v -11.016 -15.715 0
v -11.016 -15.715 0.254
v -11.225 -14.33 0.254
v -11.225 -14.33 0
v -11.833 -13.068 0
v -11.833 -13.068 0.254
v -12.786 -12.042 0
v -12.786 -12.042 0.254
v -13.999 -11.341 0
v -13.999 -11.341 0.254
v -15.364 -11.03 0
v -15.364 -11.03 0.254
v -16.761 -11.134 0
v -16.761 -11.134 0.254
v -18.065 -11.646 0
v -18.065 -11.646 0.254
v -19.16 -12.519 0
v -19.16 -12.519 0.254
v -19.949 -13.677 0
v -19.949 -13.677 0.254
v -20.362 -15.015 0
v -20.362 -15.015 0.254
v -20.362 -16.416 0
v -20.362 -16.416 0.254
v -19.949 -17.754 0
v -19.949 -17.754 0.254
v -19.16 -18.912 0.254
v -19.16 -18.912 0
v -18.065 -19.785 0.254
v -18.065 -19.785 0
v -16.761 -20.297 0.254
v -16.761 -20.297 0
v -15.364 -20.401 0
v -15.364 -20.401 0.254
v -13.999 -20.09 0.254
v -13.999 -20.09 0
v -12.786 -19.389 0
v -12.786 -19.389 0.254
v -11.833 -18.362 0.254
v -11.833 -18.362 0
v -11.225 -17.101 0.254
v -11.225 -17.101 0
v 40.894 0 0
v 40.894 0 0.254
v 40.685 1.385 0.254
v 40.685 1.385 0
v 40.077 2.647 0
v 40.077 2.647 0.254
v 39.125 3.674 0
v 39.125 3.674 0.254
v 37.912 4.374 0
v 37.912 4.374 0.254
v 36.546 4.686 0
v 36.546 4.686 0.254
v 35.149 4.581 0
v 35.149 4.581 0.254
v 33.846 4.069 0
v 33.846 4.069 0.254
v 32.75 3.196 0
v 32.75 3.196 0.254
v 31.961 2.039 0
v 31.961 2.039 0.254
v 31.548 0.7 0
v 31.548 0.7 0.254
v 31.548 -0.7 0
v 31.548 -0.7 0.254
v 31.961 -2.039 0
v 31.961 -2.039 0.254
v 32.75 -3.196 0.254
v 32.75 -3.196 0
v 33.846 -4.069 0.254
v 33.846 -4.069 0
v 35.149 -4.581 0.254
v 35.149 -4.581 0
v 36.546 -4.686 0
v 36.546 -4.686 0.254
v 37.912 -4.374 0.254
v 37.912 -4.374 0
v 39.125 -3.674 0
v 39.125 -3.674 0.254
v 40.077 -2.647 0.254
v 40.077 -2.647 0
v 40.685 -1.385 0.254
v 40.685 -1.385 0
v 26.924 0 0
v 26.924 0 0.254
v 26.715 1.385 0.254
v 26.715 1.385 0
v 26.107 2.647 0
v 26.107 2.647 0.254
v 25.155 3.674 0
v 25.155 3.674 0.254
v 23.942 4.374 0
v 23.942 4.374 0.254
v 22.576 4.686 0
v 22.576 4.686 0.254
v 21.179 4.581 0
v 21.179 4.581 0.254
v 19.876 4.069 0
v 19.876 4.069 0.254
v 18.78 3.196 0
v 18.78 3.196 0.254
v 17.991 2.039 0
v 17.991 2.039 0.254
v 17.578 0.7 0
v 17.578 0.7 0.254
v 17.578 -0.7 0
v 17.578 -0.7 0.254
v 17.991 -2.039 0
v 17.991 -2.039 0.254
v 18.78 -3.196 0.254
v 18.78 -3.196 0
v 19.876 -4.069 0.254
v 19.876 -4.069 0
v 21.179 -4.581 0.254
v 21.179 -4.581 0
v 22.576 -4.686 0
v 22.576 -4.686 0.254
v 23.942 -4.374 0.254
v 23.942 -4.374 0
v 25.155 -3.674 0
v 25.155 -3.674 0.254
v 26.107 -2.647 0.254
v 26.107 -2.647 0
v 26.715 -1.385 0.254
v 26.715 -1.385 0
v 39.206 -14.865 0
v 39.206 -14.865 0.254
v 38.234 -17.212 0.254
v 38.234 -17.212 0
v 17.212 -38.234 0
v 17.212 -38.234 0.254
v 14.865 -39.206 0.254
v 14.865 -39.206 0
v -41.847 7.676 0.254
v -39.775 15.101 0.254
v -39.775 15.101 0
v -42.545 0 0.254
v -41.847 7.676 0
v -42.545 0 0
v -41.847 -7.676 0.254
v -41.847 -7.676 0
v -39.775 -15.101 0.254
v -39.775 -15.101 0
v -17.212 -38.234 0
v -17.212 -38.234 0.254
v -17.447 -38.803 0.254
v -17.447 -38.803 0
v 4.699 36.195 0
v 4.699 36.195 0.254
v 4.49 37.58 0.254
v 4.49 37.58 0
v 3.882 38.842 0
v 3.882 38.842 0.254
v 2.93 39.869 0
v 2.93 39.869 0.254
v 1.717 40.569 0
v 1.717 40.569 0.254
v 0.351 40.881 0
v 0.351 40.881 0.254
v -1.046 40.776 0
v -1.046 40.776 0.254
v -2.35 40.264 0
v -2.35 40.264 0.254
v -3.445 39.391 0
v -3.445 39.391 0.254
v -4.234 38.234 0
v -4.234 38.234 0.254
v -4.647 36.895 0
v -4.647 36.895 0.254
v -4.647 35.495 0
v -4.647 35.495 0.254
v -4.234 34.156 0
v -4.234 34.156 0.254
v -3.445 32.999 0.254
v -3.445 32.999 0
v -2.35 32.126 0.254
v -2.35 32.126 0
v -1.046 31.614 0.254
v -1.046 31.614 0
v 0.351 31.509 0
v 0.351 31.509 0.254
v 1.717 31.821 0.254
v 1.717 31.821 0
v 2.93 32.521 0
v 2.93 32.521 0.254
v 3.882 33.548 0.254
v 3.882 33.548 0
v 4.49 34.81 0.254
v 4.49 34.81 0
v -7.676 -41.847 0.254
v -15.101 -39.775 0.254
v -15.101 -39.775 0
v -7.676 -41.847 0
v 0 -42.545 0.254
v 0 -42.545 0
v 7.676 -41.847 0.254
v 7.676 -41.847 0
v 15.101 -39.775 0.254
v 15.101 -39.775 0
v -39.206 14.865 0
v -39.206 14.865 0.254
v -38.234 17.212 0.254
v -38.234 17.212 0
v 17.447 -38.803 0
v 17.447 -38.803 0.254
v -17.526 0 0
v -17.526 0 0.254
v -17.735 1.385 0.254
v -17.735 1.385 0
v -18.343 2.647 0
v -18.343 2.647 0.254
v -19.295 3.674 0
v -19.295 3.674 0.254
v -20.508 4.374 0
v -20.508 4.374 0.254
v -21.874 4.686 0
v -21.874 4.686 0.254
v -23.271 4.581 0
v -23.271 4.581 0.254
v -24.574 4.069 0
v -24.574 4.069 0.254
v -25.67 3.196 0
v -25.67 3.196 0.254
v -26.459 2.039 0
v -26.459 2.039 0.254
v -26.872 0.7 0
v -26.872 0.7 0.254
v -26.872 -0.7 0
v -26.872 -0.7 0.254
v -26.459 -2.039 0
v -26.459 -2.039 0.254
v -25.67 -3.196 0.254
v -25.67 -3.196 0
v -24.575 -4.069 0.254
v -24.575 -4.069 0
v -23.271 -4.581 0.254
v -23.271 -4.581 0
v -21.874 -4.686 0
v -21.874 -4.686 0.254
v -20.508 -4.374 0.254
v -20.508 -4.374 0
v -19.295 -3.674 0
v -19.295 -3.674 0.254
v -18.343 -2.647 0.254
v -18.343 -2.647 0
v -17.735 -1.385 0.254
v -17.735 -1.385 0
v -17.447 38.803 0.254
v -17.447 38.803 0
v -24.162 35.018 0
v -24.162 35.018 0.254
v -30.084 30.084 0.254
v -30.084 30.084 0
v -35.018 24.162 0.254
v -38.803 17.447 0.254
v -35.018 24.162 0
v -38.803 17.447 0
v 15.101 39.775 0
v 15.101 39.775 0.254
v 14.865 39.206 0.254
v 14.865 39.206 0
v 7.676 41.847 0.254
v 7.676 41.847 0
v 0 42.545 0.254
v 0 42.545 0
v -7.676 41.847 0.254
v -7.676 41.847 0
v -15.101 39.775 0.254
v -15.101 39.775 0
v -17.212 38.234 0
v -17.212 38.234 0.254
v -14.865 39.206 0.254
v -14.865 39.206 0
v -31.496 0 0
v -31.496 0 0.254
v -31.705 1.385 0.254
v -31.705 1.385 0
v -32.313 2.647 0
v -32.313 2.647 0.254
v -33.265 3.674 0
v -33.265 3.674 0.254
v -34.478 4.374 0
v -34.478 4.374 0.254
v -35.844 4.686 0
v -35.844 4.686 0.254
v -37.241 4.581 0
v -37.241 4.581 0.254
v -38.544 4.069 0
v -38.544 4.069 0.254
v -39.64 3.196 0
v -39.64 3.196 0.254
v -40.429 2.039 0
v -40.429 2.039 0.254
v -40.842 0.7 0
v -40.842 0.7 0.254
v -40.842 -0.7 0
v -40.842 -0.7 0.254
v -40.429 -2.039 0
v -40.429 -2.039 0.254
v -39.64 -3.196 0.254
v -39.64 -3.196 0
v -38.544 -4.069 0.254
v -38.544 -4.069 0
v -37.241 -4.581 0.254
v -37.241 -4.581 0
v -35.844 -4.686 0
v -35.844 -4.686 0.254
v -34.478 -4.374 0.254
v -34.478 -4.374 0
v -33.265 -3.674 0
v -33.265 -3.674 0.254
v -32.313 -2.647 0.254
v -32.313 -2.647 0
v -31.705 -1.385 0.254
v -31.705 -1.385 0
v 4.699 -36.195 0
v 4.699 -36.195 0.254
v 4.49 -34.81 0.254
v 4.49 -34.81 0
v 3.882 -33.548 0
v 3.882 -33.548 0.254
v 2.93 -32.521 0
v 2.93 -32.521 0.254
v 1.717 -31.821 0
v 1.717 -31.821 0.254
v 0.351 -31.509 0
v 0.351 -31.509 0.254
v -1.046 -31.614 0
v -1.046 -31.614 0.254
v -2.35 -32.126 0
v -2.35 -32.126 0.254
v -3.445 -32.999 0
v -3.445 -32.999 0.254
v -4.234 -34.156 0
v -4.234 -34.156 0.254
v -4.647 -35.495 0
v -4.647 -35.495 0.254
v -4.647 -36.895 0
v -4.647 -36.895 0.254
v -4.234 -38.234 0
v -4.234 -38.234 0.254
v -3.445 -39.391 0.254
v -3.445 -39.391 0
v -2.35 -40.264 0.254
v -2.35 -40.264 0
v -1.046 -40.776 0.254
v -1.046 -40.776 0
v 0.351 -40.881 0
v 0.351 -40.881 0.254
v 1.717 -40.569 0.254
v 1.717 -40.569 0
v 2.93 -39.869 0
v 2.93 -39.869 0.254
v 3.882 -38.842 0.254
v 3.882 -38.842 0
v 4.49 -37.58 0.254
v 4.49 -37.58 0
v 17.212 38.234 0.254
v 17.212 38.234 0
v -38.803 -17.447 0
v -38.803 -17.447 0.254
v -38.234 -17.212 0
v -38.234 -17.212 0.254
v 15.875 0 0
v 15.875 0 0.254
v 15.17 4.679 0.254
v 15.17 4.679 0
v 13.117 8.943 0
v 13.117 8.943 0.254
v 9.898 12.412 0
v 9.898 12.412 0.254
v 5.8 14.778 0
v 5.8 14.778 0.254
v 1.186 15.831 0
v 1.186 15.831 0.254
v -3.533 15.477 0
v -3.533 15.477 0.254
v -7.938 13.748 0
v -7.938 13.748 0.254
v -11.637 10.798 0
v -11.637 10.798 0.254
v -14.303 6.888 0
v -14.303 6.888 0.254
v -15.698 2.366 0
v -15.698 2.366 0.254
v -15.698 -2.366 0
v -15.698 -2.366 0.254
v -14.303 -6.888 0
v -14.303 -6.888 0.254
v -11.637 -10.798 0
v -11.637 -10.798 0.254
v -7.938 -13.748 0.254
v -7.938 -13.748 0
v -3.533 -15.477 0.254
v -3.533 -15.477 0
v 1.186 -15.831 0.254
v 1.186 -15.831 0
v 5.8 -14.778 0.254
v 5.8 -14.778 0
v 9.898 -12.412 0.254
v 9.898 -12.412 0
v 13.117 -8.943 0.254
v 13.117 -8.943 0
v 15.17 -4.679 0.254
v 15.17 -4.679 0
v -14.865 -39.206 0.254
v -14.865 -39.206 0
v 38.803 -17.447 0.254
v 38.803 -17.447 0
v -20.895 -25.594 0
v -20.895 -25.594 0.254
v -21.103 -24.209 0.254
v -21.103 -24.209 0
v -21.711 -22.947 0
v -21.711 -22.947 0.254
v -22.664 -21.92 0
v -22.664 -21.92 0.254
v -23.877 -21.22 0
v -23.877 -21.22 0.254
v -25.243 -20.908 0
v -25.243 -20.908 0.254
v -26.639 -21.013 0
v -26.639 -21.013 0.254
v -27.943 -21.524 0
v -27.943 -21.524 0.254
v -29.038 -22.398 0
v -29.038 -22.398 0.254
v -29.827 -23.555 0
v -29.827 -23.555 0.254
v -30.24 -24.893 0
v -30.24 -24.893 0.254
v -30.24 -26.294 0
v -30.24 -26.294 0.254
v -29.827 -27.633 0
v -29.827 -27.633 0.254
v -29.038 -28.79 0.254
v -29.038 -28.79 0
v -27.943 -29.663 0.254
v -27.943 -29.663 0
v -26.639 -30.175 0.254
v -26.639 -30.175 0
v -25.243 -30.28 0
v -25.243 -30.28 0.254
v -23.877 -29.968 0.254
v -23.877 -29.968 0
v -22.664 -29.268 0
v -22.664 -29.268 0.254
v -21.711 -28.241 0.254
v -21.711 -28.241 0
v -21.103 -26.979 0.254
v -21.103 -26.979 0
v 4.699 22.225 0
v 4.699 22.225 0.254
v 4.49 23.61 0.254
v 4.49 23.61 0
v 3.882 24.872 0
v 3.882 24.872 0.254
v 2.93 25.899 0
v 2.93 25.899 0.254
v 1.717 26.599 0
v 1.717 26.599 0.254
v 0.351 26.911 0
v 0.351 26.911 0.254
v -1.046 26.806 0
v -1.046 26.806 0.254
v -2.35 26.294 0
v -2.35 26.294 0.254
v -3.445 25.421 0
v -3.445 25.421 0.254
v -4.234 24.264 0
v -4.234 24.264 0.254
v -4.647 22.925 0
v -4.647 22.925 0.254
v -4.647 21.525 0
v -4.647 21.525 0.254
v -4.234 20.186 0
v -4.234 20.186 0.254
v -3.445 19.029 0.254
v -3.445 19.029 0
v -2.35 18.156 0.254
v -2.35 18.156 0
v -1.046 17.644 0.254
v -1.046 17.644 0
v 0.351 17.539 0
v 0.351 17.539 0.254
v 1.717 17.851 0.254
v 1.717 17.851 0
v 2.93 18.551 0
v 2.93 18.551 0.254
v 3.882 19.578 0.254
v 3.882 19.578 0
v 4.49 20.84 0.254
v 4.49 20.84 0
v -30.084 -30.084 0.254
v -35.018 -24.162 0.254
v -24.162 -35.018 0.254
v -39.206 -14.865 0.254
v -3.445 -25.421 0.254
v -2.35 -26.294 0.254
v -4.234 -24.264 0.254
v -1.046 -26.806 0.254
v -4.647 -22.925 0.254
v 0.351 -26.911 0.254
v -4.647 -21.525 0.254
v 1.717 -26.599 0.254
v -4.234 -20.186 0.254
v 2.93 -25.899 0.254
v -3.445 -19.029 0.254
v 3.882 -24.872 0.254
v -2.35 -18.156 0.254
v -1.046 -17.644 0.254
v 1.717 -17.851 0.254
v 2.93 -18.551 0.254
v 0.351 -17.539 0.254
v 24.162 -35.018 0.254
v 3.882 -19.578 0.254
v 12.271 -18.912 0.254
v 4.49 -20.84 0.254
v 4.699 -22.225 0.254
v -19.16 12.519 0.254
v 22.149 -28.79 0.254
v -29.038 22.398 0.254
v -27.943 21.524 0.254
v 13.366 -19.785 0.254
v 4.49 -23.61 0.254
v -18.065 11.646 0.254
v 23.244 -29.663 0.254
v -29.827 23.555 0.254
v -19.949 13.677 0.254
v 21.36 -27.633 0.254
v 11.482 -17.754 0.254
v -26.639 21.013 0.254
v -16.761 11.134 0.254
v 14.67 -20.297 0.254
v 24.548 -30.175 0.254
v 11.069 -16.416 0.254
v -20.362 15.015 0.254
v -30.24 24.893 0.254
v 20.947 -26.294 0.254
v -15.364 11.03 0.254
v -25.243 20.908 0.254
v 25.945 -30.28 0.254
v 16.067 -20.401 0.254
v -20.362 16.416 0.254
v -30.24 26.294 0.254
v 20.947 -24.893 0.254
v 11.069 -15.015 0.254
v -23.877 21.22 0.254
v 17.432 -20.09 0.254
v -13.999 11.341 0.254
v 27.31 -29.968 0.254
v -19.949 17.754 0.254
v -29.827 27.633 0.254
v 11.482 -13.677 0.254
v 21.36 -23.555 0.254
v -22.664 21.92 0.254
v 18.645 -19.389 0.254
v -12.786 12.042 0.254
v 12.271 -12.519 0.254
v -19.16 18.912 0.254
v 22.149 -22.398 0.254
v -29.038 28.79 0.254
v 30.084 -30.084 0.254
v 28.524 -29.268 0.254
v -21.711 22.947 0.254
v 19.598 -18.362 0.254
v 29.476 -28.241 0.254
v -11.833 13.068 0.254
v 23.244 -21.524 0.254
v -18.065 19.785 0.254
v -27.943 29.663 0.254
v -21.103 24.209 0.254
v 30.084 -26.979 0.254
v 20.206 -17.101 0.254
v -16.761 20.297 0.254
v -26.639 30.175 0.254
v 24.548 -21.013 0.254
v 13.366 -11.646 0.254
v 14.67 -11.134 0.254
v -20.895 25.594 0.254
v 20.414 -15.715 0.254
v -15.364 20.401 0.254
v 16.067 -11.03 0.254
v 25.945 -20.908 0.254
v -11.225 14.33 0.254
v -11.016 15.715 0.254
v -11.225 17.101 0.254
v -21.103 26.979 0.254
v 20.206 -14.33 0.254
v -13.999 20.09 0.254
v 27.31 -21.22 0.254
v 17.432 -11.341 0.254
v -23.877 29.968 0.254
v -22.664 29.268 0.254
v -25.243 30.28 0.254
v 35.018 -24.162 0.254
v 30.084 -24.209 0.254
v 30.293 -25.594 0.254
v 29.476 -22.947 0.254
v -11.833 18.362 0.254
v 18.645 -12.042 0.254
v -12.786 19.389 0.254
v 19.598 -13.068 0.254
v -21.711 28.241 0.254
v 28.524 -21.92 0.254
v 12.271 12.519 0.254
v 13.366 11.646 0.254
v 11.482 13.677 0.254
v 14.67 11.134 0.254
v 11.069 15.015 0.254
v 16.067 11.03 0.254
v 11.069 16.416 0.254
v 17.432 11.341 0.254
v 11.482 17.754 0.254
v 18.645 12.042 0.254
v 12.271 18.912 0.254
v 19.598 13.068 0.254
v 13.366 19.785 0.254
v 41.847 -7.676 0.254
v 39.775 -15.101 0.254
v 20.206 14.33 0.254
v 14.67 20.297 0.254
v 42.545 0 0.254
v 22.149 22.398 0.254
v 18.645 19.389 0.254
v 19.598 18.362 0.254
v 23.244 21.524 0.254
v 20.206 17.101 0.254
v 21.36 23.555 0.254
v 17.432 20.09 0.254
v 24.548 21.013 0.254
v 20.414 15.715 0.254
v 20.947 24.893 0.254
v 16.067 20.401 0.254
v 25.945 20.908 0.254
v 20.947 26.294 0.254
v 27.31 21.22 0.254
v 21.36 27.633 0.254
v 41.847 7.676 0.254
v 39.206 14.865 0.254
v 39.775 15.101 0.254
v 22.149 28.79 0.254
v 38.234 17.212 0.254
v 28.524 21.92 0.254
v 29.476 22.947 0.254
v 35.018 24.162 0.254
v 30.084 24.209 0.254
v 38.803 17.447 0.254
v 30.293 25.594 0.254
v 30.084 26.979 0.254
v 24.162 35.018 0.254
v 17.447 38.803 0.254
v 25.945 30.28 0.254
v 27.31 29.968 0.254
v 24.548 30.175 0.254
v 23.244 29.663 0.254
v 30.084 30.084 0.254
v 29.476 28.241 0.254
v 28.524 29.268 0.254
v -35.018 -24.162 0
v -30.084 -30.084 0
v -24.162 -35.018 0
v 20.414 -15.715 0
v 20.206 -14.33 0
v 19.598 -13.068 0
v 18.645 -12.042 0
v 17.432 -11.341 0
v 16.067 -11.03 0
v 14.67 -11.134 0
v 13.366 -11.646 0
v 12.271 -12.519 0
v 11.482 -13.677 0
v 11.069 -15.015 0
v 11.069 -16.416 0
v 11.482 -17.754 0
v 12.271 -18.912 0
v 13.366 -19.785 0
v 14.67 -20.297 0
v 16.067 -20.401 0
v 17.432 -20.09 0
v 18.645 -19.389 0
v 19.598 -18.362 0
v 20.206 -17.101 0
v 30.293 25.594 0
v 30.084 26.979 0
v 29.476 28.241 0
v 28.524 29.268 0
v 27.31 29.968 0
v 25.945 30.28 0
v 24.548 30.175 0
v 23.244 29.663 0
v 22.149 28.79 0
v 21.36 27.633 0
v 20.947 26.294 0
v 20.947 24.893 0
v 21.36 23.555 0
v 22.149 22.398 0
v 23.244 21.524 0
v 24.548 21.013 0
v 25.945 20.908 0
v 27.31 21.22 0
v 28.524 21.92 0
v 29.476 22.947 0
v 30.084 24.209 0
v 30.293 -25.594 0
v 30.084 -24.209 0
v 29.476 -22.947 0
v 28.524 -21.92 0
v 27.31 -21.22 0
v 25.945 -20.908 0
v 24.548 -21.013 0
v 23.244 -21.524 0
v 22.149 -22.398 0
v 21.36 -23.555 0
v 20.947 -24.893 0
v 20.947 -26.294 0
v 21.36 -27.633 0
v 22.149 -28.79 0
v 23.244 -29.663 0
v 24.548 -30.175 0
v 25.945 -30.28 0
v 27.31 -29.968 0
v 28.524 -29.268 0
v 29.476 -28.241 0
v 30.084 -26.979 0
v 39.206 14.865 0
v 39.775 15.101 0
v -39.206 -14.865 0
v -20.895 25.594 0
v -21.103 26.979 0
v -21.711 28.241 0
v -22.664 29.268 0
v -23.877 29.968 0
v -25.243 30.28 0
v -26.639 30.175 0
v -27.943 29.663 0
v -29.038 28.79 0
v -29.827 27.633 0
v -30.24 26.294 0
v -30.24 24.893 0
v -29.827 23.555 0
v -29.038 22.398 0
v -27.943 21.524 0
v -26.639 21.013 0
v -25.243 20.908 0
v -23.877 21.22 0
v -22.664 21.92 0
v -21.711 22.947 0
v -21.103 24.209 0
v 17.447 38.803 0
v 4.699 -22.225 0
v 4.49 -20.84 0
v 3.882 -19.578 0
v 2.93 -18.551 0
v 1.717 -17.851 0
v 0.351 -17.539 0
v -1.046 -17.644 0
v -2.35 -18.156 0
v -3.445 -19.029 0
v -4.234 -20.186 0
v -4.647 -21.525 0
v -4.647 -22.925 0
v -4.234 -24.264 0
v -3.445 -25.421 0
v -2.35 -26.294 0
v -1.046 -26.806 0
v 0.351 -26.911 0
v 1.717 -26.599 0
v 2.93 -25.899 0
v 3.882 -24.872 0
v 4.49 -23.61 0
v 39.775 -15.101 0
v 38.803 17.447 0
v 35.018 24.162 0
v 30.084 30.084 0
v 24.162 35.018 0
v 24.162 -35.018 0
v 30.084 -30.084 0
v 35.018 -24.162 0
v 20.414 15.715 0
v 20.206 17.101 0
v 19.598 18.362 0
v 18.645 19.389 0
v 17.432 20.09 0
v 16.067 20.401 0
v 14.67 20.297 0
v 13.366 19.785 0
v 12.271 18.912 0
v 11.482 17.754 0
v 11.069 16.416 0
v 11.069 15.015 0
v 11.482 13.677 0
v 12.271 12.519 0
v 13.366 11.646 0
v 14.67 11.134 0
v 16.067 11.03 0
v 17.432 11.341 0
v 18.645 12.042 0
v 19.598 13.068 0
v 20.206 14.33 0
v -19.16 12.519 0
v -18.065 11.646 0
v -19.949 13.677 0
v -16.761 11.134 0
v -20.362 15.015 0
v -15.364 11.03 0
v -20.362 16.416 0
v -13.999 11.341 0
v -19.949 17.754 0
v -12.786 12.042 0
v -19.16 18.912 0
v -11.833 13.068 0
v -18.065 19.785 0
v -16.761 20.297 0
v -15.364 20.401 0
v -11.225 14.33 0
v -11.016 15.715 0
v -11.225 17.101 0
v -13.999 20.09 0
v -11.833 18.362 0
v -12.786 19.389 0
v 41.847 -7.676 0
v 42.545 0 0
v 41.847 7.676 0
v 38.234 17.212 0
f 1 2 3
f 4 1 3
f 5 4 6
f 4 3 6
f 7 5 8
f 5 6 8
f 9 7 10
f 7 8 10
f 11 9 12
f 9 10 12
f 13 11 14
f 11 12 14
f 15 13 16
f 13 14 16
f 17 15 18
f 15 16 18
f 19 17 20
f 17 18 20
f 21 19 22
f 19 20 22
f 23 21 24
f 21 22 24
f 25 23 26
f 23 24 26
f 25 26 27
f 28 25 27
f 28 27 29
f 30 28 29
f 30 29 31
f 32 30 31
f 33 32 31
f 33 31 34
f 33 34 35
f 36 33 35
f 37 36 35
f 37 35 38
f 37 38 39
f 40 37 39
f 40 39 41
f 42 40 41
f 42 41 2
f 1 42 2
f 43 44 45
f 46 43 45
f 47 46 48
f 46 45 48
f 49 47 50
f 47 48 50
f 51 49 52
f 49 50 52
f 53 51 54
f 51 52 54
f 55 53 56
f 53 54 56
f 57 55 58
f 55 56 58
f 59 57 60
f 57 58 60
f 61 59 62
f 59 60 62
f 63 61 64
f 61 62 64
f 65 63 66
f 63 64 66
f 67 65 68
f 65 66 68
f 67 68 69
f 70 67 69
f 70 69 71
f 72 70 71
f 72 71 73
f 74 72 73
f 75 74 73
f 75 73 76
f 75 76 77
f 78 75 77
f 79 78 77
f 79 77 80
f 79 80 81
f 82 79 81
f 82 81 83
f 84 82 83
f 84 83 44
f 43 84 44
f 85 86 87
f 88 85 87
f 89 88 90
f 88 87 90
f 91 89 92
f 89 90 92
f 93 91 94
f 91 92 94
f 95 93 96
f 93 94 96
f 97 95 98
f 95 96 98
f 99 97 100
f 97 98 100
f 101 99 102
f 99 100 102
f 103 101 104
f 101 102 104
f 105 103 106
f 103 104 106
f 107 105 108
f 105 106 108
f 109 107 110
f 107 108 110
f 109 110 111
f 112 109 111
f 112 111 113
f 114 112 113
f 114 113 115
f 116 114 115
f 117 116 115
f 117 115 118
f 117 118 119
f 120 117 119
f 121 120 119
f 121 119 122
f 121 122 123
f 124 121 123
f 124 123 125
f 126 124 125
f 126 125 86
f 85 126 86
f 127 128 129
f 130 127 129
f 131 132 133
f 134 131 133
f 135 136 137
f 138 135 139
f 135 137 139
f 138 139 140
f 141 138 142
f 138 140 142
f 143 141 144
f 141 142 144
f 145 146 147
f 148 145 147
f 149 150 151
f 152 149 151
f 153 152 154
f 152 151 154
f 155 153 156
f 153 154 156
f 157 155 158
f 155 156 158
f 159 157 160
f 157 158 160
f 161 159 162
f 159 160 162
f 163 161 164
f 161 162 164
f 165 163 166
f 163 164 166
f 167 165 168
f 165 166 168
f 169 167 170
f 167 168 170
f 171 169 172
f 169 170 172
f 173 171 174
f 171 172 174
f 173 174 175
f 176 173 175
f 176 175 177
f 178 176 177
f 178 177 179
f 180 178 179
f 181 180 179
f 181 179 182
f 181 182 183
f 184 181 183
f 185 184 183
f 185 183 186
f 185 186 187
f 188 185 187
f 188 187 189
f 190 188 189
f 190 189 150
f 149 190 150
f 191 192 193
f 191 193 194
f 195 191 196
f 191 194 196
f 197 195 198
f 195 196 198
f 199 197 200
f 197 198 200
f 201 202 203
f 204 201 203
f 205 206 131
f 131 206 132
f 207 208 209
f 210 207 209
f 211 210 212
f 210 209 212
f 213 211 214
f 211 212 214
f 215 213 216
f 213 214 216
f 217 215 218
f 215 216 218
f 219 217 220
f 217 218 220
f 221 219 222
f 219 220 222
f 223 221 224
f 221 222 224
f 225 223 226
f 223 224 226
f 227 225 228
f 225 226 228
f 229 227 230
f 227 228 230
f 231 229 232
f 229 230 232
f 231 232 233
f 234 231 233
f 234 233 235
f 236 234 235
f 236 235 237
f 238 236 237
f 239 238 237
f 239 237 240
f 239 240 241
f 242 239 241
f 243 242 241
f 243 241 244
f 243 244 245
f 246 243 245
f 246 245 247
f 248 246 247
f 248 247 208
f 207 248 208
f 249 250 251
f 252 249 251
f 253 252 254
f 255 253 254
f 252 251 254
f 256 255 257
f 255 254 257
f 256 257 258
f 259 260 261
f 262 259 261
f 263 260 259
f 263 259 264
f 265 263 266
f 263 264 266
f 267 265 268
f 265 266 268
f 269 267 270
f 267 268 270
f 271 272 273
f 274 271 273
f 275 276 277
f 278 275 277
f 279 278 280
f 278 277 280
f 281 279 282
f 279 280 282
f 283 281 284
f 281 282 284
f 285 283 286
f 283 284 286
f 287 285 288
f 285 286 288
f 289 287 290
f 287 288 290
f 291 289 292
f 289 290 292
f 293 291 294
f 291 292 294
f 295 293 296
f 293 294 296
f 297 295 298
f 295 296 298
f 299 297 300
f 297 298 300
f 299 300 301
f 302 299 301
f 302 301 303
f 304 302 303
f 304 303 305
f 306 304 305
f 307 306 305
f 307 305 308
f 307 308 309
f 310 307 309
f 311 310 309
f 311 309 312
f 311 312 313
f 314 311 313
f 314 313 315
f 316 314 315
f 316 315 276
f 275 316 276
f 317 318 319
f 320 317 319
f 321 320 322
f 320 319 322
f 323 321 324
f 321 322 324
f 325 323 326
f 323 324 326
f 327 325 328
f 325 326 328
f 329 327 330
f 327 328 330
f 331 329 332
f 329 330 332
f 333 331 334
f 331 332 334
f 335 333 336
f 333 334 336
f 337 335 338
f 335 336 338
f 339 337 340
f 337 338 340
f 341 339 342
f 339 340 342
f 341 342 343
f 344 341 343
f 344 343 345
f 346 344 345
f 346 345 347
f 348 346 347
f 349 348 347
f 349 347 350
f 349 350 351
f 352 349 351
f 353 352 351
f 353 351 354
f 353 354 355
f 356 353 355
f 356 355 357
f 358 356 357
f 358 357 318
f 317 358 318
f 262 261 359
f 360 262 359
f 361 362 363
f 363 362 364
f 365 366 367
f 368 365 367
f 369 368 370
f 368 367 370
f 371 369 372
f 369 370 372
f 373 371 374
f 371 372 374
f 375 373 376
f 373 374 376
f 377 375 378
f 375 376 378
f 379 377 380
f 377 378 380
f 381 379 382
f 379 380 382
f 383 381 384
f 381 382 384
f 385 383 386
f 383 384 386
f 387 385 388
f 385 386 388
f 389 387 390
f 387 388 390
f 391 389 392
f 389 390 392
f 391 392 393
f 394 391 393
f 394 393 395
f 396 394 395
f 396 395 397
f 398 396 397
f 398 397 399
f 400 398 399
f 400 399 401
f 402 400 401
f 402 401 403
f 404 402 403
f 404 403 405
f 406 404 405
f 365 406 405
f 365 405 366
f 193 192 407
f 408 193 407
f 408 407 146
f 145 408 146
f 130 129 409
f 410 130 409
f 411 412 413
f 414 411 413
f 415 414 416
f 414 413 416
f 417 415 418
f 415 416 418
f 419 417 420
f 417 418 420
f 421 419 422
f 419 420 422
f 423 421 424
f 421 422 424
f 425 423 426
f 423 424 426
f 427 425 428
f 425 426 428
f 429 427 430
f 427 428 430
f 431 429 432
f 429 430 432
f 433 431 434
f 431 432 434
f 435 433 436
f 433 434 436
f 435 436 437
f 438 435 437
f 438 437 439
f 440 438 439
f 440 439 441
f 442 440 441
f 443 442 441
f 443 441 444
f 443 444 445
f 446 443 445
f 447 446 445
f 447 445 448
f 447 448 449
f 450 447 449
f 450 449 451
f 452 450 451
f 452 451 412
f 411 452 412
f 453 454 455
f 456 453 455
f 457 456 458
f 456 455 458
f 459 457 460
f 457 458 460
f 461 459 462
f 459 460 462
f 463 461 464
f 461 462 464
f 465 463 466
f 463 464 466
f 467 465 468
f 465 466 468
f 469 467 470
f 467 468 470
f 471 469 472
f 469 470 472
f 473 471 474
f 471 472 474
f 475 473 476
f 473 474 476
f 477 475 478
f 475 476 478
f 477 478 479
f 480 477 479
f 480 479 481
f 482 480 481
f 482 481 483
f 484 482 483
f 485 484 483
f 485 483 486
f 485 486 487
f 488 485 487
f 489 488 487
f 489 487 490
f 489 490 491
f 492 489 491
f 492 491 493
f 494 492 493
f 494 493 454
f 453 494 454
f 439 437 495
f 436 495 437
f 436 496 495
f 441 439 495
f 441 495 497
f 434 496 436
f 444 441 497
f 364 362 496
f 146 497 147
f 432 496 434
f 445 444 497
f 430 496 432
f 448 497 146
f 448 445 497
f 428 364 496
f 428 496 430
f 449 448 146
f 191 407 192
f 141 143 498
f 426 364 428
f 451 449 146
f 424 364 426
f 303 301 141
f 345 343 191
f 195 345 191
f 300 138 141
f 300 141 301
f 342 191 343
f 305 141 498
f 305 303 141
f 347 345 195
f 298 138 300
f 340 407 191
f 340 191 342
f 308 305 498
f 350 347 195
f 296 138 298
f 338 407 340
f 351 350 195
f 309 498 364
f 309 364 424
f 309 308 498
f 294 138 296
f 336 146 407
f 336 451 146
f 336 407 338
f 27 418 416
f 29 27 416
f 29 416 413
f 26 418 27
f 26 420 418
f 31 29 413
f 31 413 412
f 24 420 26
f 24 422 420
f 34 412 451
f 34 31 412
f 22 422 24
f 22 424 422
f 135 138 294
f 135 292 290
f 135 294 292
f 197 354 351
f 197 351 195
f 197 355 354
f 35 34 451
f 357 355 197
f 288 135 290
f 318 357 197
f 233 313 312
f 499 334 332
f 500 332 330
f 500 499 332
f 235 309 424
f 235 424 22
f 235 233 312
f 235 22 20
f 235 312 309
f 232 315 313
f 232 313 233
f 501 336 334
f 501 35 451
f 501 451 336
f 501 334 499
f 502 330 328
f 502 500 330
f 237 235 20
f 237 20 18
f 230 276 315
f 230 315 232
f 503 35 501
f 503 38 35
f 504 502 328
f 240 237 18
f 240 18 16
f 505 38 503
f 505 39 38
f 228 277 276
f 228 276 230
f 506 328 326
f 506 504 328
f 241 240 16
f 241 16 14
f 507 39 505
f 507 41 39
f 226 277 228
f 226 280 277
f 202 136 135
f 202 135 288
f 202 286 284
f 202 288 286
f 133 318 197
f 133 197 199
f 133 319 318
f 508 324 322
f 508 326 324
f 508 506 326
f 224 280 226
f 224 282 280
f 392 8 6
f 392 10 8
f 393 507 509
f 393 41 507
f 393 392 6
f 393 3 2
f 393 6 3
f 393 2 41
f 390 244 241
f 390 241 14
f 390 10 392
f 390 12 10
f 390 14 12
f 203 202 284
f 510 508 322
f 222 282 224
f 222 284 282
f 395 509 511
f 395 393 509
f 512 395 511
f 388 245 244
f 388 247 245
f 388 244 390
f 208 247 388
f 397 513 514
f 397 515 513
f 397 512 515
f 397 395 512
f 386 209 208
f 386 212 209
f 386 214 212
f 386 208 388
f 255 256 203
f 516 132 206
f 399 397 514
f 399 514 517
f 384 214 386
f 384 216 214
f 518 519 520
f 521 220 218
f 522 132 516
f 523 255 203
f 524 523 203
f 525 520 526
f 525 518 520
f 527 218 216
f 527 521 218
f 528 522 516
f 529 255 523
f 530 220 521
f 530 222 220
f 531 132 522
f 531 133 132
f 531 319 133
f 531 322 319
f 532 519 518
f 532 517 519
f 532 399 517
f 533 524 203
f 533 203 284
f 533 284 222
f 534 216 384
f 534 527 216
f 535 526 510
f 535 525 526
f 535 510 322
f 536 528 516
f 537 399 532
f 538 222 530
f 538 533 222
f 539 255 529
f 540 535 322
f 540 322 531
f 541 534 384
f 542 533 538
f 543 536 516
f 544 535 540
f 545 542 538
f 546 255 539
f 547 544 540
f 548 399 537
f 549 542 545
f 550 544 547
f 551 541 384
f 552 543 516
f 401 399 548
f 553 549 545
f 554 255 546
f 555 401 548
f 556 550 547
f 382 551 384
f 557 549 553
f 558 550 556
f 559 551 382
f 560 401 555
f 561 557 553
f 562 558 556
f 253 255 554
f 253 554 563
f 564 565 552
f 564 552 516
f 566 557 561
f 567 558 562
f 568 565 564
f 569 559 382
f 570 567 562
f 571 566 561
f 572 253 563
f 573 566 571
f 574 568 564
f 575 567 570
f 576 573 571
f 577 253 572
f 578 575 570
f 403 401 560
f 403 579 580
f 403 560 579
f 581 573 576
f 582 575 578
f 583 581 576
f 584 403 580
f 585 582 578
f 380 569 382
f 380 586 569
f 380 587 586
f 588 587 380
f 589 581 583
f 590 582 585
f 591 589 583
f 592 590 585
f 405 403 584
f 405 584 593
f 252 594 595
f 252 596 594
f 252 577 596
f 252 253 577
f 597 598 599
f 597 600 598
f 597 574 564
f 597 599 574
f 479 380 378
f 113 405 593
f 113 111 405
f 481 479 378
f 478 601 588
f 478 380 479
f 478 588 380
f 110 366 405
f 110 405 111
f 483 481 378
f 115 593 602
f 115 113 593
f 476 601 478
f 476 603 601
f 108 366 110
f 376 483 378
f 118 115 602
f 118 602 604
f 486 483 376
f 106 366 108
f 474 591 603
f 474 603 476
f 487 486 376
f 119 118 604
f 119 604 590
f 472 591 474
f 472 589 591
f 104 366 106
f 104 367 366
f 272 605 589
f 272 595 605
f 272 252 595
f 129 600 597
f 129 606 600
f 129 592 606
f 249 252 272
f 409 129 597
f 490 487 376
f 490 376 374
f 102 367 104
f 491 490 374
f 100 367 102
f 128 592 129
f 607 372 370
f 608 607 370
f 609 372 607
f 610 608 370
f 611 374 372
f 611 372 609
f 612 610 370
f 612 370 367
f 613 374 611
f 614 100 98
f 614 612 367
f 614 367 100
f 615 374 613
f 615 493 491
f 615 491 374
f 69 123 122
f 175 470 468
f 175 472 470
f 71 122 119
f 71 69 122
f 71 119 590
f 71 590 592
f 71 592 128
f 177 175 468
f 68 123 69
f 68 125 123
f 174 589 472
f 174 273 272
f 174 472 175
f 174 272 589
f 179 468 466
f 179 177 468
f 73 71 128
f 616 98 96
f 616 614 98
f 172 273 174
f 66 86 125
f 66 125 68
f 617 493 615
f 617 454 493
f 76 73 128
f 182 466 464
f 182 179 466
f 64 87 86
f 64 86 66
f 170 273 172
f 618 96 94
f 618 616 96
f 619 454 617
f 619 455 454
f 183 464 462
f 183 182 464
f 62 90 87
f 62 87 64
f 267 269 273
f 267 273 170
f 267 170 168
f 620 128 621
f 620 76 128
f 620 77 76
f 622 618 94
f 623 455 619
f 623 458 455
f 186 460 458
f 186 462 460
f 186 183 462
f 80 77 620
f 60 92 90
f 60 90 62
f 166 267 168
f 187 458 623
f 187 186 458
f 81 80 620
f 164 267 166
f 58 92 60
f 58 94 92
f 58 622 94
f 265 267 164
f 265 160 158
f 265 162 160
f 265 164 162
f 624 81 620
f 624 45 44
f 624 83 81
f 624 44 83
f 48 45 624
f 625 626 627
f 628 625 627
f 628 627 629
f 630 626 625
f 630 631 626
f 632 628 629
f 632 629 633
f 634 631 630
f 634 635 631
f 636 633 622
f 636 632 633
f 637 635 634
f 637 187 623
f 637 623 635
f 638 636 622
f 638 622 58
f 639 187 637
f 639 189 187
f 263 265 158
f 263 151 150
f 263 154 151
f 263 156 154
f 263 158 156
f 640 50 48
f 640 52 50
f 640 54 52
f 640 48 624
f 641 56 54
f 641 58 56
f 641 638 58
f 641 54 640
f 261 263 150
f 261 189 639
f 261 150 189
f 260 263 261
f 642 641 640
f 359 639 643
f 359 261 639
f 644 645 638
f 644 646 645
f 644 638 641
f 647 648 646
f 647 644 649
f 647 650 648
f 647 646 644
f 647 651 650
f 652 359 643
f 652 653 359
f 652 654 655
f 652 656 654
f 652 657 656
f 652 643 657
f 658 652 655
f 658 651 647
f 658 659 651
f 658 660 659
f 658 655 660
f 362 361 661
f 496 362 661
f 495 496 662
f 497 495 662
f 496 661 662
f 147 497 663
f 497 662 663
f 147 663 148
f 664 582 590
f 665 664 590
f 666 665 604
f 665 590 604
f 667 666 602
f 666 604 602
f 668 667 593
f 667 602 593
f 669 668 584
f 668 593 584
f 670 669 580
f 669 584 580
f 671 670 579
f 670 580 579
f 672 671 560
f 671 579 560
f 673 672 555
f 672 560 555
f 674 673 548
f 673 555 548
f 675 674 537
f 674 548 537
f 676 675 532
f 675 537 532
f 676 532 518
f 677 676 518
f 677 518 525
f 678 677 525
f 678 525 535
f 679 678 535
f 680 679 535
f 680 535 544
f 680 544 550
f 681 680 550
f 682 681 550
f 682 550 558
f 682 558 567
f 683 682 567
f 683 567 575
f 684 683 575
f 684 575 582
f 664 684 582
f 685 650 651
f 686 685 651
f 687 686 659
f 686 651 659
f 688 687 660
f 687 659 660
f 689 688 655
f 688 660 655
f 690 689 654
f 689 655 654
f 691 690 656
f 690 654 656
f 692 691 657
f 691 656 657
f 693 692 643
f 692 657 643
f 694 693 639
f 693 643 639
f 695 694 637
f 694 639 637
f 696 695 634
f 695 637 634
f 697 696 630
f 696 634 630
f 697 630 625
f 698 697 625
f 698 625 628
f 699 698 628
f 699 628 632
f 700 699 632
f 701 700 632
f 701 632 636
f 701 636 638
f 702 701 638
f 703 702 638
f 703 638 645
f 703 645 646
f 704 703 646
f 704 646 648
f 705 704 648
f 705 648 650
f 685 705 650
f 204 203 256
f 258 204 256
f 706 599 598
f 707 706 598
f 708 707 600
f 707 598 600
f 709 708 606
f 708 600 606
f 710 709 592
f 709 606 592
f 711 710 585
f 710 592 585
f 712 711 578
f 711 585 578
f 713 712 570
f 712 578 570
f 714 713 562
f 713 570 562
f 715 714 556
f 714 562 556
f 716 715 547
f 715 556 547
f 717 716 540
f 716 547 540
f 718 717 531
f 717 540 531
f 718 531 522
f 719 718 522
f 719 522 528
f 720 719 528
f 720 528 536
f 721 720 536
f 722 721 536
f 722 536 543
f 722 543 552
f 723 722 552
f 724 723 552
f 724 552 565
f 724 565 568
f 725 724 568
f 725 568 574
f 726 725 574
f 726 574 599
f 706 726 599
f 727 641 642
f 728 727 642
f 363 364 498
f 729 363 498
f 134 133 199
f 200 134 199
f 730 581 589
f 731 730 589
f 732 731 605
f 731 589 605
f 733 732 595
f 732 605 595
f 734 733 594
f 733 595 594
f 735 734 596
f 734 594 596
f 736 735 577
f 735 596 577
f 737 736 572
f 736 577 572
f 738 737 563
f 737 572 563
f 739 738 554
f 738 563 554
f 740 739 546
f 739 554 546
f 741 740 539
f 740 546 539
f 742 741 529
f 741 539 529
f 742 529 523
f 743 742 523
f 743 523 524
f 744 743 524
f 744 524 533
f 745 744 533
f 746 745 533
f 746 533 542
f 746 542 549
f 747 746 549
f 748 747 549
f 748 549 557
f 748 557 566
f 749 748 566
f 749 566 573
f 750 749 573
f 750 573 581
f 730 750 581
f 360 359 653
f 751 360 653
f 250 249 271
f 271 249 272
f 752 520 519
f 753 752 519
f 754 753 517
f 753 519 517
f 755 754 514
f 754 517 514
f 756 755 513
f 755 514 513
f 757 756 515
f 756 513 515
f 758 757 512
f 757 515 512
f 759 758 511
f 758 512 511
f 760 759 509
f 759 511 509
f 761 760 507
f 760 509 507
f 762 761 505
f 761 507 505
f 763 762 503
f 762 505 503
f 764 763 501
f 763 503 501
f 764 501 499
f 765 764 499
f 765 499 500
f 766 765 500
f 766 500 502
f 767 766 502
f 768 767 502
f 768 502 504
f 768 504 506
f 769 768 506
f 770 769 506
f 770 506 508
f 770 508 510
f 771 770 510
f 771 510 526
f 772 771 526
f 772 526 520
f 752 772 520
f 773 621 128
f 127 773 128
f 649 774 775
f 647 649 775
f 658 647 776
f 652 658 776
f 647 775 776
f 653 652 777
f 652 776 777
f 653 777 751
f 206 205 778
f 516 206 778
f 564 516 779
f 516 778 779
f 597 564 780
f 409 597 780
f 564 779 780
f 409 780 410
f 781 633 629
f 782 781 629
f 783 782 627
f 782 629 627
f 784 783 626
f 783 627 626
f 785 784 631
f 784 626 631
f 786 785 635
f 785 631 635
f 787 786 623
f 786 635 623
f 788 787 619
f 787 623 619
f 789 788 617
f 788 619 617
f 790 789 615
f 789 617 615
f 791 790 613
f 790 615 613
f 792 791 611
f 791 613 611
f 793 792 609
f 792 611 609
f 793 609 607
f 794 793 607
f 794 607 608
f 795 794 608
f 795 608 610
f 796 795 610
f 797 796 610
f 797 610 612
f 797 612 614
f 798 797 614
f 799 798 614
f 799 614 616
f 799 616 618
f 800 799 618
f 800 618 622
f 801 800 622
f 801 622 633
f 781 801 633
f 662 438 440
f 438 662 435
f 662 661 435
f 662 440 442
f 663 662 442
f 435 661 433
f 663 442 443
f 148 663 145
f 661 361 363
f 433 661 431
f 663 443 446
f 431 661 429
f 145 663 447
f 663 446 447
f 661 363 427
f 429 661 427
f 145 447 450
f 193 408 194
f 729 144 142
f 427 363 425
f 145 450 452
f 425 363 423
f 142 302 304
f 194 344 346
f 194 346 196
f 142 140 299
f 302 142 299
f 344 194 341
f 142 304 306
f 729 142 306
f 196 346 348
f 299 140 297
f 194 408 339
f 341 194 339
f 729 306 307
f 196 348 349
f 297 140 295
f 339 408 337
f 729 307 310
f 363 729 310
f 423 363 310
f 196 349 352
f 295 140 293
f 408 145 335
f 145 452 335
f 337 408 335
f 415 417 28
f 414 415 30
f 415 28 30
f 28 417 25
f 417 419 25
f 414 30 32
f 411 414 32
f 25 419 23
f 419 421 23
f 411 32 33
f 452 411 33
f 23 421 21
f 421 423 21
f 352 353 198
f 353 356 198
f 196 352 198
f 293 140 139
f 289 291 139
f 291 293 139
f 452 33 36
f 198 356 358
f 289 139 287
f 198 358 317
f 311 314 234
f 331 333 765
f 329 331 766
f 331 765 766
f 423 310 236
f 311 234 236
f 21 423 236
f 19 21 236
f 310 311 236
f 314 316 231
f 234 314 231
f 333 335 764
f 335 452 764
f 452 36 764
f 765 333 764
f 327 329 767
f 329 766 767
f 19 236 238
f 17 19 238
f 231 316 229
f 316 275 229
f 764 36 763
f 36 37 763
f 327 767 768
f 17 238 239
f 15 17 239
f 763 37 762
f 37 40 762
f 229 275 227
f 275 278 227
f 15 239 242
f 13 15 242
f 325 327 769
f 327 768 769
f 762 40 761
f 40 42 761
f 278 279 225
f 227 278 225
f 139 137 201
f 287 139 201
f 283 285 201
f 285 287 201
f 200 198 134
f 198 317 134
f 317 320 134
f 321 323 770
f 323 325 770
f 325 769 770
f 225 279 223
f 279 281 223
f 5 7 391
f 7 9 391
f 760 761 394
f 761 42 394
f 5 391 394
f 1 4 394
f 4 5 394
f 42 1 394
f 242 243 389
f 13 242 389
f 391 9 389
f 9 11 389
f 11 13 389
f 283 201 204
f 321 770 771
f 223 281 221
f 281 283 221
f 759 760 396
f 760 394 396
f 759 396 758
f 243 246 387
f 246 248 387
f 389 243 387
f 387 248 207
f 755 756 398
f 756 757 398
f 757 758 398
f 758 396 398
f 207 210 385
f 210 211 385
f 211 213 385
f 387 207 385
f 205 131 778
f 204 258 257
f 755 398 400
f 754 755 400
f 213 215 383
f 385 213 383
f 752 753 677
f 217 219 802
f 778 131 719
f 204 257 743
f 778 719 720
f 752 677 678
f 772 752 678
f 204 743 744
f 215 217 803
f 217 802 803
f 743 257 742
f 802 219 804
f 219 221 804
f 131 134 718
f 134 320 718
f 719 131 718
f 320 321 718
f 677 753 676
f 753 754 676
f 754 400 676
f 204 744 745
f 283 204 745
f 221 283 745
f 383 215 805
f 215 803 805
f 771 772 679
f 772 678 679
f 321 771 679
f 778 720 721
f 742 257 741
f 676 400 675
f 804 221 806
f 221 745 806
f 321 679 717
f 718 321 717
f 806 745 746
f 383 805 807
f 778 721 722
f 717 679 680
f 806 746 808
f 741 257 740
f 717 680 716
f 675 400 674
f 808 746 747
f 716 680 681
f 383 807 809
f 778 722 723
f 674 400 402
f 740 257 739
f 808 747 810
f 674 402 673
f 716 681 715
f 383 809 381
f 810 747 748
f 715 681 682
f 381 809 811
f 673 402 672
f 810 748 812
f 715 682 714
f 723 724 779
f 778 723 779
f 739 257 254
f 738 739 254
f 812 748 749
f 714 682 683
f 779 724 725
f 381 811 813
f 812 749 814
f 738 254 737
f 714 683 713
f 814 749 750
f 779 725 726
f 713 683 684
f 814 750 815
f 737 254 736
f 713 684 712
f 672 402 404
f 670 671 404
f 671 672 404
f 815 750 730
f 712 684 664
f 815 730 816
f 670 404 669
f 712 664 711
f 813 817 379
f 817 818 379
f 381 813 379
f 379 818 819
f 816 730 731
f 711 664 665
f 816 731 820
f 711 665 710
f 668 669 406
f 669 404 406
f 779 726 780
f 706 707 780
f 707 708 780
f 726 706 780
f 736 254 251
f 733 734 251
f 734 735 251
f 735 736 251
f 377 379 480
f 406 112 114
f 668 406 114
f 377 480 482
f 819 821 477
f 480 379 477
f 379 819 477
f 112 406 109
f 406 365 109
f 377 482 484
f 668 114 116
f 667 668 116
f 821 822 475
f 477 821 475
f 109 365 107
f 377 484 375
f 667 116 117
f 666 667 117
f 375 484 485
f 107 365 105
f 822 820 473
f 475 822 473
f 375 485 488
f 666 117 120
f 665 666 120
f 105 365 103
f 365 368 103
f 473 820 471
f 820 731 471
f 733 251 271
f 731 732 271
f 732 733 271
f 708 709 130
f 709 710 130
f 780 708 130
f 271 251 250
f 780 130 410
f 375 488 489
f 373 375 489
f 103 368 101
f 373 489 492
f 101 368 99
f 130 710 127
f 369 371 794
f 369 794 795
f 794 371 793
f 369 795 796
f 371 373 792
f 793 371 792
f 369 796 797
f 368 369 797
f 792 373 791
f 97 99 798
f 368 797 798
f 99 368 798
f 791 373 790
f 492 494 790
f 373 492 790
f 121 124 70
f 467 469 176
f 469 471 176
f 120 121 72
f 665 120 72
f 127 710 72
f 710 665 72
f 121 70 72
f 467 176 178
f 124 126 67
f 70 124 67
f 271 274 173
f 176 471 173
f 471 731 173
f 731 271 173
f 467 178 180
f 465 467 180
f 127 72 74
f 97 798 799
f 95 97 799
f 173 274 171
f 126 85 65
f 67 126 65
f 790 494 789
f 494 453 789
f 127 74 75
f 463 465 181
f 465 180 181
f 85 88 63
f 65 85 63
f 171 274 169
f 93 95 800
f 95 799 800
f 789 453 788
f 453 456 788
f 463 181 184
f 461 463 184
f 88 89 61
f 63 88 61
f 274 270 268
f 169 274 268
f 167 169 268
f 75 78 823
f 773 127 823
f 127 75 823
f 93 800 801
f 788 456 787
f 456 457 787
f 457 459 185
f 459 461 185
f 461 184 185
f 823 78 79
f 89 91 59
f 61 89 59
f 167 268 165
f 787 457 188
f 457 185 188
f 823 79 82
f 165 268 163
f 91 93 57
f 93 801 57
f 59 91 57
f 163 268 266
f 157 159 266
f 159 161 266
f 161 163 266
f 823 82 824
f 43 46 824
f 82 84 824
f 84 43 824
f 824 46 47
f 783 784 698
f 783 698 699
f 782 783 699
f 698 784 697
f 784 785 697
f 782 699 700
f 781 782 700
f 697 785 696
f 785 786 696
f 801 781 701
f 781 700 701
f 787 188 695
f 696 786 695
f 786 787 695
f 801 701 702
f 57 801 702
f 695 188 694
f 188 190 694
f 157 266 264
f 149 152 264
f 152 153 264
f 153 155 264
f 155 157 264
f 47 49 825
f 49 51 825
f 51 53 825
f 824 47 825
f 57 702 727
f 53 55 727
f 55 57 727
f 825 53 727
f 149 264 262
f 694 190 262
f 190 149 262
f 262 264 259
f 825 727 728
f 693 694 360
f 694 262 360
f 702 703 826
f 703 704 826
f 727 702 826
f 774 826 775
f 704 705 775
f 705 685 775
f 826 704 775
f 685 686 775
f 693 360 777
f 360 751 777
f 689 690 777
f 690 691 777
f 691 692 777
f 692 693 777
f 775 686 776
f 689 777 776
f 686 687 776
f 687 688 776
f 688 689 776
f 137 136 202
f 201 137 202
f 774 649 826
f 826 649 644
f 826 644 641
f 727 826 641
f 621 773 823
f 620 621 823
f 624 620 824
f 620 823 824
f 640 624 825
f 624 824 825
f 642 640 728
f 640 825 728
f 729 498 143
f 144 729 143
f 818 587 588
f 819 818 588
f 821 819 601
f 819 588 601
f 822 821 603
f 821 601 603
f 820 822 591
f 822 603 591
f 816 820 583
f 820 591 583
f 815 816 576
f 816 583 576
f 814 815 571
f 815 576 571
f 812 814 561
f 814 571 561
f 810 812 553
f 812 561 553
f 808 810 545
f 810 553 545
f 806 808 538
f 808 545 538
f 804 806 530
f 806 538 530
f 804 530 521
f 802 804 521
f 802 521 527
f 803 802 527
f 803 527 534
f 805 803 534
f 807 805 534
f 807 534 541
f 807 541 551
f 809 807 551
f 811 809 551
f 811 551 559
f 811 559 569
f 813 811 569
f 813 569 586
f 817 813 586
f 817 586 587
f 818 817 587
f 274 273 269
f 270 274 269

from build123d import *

# Parameters (mm, degrees)
SKETCH4_R           = 42.545
BOSS_EXTRUDE2_DEPTH = 0.254
SKETCH5_R           = 15.875
CUT_EXTRUDE5_DEPTH  = 1.254
CUT_EXTRUDE11_DEPTH = 1.254
SKETCH9_R           = 4.699
CUT_EXTRUDE12_DEPTH = 1.254


with BuildPart() as part:
    # Sketch4 → Boss-Extrude2 (new body)
    with BuildSketch(Plane.XY):
        Circle(SKETCH4_R)
    extrude(amount=BOSS_EXTRUDE2_DEPTH)

    # Sketch5 → Cut-Extrude5 (cut, through all)
    with BuildSketch(Plane.XY.offset(0.254)):
        Circle(SKETCH5_R)
    extrude(amount=-CUT_EXTRUDE5_DEPTH, mode=Mode.SUBTRACT)

    # Sketch8 → Cut-Extrude11 (cut, through all)
    with BuildSketch(Plane.XY.offset(0.254)):
        Polygon((40.379126173, 15.350943603), (39.407110255, 17.697597616), (38.233783248, 17.211589657), (39.205799167, 14.864935644), align=None)
        Polygon((-15.350943603, 40.379126173), (-17.697597616, 39.407110255), (-17.211589657, 38.233783248), (-14.864935644, 39.205799167), align=None)
        Polygon((-39.407110255, 17.697597616), (-40.379126173, 15.350943603), (-39.205799167, 14.864935644), (-38.233783248, 17.211589657), align=None)
        Polygon((-40.379126173, -15.350943603), (-39.407110255, -17.697597616), (-38.233783248, -17.211589657), (-39.205799167, -14.864935644), align=None)
        Polygon((-17.697597616, -39.407110255), (-15.350943603, -40.379126173), (-14.864935644, -39.205799167), (-17.211589657, -38.233783248), align=None)
        Polygon((15.350943603, -40.379126173), (17.697597616, -39.407110255), (17.211589657, -38.233783248), (14.864935644, -39.205799167), align=None)
        Polygon((39.407110255, -17.697597616), (40.379126173, -15.350943603), (39.205799167, -14.864935644), (38.233783248, -17.211589657), align=None)
        Polygon((17.697597616, 39.407110255), (15.350943603, 40.379126173), (14.864935644, 39.205799167), (17.211589657, 38.233783248), align=None)
    extrude(amount=-CUT_EXTRUDE11_DEPTH, mode=Mode.SUBTRACT)

    # Sketch9 → Cut-Extrude12 (cut, through all)
    with BuildSketch(Plane.XY.offset(0.254)):
        with Locations((22.225, 0)):
            Circle(SKETCH9_R)
        with Locations((36.195, 0)):
            Circle(SKETCH9_R)
        with Locations((15.715448212, -15.715448212)):
            Circle(SKETCH9_R)
        with Locations((25.593729945, -25.593729945)):
            Circle(SKETCH9_R)
        with Locations((0, -22.225)):
            Circle(SKETCH9_R)
        with Locations((0, -36.195)):
            Circle(SKETCH9_R)
        with Locations((-15.715448212, -15.715448212)):
            Circle(SKETCH9_R)
        with Locations((-25.593729945, -25.593729945)):
            Circle(SKETCH9_R)
        with Locations((-22.225, 0)):
            Circle(SKETCH9_R)
        with Locations((-36.195, 0)):
            Circle(SKETCH9_R)
        with Locations((-15.715448212, 15.715448212)):
            Circle(SKETCH9_R)
        with Locations((-25.593729945, 25.593729945)):
            Circle(SKETCH9_R)
        with Locations((0, 22.225)):
            Circle(SKETCH9_R)
        with Locations((0, 36.195)):
            Circle(SKETCH9_R)
        with Locations((15.715448212, 15.715448212)):
            Circle(SKETCH9_R)
        with Locations((25.593729945, 25.593729945)):
            Circle(SKETCH9_R)
    extrude(amount=-CUT_EXTRUDE12_DEPTH, mode=Mode.SUBTRACT)


solid = part.part
